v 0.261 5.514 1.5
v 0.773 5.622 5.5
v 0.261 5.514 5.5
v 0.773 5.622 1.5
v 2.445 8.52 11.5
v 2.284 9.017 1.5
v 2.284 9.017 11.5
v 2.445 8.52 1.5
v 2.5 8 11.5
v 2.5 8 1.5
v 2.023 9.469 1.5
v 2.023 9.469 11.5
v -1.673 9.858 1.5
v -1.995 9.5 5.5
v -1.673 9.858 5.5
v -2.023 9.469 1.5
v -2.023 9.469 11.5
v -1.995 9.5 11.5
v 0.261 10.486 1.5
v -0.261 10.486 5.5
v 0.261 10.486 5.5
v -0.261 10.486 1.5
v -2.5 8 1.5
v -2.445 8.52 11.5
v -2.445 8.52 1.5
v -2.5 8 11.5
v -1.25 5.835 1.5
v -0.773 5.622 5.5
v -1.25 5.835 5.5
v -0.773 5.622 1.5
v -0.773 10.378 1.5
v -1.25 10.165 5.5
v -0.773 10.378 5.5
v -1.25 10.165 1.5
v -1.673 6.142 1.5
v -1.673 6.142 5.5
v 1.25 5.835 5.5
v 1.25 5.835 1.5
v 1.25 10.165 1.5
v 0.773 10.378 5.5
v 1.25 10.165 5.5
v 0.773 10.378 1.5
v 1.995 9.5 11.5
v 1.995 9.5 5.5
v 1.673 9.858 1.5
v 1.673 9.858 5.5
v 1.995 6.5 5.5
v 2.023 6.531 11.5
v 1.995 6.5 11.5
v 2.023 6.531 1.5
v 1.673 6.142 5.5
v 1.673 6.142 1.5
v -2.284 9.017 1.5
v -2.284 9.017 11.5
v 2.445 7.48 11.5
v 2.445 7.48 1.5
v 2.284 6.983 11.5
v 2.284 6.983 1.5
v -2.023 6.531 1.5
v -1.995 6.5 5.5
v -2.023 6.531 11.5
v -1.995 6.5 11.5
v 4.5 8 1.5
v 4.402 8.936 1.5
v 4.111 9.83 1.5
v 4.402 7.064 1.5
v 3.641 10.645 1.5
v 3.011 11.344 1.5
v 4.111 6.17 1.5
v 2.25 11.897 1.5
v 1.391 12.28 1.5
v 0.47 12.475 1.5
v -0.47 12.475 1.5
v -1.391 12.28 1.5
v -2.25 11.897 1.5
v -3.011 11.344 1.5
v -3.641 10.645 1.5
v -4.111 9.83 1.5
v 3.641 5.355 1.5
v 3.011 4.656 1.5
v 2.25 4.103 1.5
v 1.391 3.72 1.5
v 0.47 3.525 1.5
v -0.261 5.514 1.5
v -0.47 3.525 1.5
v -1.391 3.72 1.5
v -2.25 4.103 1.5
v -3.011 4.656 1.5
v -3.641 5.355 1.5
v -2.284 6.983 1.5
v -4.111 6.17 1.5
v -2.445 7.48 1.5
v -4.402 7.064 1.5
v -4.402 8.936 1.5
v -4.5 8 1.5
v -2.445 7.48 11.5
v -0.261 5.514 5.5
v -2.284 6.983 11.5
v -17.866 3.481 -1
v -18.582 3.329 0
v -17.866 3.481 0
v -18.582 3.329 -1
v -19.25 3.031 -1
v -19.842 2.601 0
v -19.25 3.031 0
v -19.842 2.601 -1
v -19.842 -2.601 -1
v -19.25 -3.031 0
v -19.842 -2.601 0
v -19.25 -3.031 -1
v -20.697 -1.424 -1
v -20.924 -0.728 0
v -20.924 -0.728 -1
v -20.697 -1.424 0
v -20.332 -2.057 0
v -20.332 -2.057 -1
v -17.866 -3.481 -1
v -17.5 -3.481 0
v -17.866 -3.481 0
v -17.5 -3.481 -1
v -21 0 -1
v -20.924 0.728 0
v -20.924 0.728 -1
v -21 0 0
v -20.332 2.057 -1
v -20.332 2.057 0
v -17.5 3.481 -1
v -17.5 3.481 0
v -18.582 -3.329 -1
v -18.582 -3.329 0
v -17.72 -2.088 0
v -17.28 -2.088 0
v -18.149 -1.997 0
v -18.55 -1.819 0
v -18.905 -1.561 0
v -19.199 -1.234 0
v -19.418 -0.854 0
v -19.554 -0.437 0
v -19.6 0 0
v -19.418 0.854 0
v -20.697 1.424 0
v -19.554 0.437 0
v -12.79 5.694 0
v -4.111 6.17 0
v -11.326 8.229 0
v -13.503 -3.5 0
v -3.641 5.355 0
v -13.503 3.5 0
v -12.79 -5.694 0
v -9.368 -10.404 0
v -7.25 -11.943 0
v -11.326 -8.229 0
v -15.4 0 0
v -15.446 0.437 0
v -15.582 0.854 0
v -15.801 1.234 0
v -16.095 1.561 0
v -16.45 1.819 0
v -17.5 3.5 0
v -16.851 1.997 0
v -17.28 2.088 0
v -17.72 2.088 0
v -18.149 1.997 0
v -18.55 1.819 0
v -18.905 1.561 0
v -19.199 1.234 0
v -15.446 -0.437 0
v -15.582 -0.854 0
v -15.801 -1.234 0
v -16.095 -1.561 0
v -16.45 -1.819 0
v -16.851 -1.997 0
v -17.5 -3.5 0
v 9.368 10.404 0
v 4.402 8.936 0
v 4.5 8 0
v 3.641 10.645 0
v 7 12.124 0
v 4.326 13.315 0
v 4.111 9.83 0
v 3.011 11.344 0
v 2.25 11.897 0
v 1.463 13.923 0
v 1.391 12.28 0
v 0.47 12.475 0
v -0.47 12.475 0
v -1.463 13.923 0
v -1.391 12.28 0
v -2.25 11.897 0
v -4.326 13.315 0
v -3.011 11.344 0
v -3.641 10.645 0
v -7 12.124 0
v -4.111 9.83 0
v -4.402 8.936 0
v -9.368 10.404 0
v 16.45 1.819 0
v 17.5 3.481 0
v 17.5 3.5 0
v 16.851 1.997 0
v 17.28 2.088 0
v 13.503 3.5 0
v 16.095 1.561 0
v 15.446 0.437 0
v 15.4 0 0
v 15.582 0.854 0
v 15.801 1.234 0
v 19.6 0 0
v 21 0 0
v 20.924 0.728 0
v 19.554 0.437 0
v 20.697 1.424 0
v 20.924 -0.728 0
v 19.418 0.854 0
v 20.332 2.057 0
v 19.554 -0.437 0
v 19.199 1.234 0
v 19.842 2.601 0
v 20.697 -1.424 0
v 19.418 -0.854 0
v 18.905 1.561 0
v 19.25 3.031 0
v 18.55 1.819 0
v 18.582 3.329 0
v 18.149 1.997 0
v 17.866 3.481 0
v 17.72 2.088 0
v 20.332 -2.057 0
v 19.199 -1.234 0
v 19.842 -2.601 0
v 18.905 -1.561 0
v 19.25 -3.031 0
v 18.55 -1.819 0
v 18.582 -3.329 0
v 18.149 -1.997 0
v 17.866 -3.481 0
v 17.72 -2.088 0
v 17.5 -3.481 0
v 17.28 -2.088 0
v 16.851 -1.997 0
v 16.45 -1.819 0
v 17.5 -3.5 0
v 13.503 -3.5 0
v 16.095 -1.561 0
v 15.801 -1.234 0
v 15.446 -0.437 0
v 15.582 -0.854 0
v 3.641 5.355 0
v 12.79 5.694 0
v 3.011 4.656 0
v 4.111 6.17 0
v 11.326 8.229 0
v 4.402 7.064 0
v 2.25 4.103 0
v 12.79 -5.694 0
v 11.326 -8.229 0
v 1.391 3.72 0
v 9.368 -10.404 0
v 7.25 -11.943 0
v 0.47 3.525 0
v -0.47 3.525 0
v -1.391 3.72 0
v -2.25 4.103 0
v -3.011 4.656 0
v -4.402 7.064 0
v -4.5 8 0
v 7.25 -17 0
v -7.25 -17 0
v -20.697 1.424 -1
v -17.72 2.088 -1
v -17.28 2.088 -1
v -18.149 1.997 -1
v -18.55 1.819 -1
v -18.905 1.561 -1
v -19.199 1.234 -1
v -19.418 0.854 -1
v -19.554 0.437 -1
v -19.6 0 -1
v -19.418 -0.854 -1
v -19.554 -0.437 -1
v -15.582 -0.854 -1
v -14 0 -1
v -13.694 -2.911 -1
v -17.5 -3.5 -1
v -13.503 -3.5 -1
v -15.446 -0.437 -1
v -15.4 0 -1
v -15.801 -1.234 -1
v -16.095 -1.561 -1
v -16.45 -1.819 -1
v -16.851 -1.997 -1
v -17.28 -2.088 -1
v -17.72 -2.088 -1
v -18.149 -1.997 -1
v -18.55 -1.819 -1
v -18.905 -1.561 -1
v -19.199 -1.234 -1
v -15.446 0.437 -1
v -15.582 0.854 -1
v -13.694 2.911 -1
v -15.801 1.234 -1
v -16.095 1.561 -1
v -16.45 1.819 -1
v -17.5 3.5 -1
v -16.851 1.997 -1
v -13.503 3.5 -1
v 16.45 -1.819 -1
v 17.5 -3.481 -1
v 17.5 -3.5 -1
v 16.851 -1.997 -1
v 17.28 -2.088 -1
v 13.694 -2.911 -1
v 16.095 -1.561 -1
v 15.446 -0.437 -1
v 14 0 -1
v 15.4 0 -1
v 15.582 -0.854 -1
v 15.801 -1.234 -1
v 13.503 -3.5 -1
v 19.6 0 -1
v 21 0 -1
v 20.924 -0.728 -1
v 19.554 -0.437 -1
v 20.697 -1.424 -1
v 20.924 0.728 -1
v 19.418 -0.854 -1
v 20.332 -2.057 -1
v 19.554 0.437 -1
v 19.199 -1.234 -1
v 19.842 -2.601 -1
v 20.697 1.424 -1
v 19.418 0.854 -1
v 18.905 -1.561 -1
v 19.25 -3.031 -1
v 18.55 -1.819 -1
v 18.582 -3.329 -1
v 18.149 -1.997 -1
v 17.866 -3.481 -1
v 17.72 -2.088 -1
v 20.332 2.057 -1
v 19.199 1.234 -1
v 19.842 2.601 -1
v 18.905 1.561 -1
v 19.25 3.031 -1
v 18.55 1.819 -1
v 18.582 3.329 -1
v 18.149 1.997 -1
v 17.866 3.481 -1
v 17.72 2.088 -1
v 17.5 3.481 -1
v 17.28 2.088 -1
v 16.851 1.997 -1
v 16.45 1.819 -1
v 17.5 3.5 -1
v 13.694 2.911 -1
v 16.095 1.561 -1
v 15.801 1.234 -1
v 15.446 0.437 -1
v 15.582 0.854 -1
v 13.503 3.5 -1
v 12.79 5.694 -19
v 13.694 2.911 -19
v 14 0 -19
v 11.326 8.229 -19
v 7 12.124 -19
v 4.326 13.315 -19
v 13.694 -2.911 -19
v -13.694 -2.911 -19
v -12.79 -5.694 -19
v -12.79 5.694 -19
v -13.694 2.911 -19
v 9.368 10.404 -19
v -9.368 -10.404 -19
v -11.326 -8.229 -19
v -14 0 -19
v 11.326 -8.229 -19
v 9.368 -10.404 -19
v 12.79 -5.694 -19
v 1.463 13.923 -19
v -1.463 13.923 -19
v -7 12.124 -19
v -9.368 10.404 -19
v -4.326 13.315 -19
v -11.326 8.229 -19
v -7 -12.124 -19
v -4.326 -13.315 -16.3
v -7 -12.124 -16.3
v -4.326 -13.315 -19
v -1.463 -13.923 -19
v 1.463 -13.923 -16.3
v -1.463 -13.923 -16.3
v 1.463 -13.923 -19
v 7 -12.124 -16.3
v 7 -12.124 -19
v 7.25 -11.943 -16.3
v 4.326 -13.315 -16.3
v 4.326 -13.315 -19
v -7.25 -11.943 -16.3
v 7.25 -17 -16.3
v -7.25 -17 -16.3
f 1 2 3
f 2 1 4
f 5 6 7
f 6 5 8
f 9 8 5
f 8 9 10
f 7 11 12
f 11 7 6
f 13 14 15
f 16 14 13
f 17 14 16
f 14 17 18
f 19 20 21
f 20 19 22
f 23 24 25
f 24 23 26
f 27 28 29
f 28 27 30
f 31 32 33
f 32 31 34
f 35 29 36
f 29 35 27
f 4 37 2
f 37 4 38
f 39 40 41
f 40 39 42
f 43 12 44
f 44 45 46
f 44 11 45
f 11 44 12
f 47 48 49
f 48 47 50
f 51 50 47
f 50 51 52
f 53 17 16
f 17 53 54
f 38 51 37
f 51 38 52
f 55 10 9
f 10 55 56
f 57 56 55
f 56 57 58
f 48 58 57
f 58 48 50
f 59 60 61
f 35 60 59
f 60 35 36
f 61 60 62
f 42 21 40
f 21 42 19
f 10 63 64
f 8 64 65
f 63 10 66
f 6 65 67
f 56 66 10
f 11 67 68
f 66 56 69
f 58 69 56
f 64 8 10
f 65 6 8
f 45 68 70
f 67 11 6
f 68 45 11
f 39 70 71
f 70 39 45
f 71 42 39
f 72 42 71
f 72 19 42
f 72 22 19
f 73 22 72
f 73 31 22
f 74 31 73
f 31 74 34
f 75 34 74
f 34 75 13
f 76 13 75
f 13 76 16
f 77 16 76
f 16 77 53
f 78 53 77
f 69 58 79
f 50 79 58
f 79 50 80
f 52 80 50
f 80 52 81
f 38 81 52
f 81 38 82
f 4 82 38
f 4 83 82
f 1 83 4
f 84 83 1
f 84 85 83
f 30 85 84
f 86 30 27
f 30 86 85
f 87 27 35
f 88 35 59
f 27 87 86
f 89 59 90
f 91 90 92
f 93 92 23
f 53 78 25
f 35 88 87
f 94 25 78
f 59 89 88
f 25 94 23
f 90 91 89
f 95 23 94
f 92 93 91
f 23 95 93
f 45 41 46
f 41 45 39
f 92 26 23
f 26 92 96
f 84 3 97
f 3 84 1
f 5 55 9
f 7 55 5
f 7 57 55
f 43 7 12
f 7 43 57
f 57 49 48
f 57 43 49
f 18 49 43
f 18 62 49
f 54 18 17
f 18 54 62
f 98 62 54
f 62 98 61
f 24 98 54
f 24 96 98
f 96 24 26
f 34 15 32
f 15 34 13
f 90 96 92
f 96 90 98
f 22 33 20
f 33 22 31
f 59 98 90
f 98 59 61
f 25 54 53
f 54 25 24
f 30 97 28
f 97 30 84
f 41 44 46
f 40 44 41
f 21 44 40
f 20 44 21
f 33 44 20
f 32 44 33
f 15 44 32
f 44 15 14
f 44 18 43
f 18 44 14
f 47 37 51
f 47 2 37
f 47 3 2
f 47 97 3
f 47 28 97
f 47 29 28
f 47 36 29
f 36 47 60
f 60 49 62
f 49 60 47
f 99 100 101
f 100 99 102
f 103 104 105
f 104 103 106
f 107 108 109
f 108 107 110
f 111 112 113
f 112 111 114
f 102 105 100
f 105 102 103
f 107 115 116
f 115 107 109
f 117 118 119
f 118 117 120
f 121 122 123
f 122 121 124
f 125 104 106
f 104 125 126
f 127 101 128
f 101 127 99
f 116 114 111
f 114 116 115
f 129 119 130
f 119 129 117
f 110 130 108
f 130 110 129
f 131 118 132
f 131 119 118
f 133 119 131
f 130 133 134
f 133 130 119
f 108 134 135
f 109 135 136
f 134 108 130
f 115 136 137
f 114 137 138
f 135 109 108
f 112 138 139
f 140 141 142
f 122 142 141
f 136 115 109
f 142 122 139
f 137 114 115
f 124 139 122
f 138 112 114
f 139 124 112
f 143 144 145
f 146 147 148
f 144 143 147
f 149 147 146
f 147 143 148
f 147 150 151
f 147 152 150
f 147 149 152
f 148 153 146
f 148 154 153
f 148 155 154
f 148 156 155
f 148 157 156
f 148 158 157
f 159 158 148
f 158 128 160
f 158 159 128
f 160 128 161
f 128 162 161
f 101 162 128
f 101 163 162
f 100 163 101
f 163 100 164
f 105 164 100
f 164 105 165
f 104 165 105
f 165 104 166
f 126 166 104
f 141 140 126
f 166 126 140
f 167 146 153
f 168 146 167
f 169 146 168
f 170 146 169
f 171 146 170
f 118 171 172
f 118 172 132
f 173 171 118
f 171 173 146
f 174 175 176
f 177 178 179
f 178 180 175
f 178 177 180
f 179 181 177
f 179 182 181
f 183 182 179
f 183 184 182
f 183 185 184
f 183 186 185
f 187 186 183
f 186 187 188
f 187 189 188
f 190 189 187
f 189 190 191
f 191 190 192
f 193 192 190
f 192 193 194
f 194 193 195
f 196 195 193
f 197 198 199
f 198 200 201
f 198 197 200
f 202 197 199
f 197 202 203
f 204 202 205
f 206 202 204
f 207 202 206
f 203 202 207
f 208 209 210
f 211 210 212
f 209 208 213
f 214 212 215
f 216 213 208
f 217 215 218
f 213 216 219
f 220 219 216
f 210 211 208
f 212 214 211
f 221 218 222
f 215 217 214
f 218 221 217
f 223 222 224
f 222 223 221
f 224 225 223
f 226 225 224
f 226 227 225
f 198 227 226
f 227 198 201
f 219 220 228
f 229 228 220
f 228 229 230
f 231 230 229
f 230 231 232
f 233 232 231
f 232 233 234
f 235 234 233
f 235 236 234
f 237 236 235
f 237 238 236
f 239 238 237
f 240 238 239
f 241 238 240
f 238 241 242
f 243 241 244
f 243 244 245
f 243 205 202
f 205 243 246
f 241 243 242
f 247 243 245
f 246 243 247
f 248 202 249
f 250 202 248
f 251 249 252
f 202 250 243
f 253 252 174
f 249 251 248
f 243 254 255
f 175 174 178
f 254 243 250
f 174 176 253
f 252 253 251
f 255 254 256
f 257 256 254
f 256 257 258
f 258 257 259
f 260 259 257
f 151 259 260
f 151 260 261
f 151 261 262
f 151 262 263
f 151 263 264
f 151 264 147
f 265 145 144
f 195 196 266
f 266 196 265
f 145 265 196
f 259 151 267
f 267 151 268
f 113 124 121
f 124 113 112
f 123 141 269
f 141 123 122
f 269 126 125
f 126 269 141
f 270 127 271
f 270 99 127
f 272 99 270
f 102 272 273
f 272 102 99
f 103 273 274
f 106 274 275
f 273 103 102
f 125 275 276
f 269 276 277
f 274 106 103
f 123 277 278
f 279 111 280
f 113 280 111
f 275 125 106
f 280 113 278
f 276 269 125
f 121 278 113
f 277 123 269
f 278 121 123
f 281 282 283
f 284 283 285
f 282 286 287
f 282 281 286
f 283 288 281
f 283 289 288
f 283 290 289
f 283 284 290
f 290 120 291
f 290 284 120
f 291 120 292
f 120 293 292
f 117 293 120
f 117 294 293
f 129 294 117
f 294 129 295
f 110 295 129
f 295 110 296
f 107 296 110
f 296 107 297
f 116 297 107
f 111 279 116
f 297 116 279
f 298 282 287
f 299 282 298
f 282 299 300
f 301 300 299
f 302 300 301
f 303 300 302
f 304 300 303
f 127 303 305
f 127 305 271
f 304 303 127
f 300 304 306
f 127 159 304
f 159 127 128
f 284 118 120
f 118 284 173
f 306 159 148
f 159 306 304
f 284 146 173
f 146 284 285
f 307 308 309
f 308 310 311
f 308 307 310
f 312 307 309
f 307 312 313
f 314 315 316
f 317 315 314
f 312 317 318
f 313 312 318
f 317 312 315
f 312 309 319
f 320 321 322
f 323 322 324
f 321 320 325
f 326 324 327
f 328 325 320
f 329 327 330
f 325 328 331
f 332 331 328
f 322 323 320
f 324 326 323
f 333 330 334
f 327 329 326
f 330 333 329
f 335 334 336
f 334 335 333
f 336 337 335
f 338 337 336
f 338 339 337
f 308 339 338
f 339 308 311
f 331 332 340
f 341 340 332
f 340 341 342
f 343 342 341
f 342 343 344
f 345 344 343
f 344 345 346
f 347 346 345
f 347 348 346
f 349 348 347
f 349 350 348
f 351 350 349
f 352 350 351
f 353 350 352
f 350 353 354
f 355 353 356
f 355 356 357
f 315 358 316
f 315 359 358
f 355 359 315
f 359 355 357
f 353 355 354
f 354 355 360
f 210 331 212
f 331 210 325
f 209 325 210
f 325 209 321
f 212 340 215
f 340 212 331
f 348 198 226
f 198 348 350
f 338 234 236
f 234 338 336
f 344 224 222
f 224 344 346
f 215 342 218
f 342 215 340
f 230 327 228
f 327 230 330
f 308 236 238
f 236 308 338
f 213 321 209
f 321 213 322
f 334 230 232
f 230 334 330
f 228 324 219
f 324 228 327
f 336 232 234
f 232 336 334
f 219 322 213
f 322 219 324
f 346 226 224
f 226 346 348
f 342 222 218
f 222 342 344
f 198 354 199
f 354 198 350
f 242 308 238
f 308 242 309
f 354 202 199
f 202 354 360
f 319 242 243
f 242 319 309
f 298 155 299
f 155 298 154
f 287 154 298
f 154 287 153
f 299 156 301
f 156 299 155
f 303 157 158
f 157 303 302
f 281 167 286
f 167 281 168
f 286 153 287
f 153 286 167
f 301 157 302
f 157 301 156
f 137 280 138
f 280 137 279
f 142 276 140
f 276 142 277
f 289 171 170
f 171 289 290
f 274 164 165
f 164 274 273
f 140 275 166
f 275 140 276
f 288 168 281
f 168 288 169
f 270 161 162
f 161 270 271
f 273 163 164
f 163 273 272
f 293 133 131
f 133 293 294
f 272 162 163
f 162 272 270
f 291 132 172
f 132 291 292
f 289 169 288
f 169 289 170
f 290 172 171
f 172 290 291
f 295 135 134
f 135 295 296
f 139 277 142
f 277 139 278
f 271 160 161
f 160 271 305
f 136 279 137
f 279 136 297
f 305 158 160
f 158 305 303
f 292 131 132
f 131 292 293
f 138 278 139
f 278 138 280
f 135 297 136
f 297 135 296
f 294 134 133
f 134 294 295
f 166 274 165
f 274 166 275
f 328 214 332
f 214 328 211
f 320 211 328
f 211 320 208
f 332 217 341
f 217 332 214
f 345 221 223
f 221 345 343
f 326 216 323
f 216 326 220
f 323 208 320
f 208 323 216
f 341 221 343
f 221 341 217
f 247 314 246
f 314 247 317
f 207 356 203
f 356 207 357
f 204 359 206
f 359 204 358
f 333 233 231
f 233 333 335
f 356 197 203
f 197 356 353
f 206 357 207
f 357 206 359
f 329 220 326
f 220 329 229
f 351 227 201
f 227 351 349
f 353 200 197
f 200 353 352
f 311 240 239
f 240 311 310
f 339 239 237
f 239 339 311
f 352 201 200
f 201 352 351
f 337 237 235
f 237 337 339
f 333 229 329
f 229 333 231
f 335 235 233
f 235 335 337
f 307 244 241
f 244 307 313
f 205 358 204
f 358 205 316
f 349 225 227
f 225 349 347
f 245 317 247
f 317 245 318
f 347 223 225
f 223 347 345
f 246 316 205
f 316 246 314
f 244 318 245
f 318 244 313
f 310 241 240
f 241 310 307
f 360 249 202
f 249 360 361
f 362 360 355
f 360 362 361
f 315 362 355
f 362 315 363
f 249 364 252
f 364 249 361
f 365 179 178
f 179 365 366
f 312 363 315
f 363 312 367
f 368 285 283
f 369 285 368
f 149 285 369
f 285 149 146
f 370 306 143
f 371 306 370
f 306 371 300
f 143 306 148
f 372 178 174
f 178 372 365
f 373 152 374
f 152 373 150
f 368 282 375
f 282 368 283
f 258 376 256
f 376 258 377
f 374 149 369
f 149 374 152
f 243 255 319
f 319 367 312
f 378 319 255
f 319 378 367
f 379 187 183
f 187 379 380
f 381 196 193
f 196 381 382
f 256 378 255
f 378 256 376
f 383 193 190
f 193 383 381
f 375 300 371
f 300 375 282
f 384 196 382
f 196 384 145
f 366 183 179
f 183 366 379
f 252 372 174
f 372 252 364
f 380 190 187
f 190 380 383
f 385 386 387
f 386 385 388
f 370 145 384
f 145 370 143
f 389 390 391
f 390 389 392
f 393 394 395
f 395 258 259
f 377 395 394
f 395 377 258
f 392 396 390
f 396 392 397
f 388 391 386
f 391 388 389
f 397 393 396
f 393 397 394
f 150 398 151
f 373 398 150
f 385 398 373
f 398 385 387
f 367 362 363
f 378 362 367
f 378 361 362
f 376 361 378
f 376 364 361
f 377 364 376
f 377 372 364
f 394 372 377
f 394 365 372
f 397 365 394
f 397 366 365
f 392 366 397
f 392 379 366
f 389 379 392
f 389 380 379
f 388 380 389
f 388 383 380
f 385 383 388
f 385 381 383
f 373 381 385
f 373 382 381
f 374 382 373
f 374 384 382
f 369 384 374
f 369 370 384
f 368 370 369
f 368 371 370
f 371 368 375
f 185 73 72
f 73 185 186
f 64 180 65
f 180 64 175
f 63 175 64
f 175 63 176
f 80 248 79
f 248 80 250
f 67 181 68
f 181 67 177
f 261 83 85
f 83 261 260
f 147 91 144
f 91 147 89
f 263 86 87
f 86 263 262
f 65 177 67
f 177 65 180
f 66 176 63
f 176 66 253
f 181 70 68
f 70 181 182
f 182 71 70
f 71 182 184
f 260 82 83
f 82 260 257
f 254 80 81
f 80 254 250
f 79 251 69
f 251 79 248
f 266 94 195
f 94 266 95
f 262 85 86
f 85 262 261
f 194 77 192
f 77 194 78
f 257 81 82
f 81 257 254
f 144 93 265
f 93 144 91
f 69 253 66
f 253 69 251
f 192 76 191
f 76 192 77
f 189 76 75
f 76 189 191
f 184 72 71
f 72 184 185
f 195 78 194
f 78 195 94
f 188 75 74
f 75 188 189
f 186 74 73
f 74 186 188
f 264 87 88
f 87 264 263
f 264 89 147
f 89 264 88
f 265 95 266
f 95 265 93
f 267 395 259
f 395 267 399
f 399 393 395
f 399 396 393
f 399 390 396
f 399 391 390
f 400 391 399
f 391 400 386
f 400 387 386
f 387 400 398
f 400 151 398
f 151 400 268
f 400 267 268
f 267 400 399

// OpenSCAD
include <MCAD/units.scad>

module byj_motor_mount(slide_distance=0, mochup=true, tolerance=0){

	motor_shaft_diameter = 5*mm;
	motor_shaft_length = 10*mm;
	motor_shaft_key = 6*mm;
	pilot_diameter = 9*mm;
	pilot_length = 1.5*mm;
	bolt_hole_size = 4.2*mm;
	bolt_hole_distance = 35*mm;
	pilot_offset = 8*mm;
	motor_diameter = 28*mm;
	motor_length = 19*mm;
	wire_harness_width = 14.5*mm;
	wire_harness_offset = 17*mm;
	wire_harness_length = motor_length - 2.7*mm;
	mounting_tab_width = 7*mm;
	$fn = 30;



	// == motor mock-up ==
	//motor box
	if (mochup == true)
	{
		union(){

		// motor body
		translate([0, 0, -motor_length]) cylinder(r = motor_diameter / 2, h = motor_length);

		// pilot
		translate([0, pilot_offset, 0]) cylinder(r=pilot_diameter / 2, h = pilot_length);

		// shaft
		difference(){
		translate([0, pilot_offset, pilot_length]) cylinder(r = motor_shaft_diameter / 2, h = motor_shaft_length);
		translate([- motor_shaft_diameter / 2, pilot_offset + motor_shaft_diameter / 2 - 1, pilot_length + motor_shaft_length - motor_shaft_key]) cube([motor_shaft_diameter, 2, motor_shaft_key + 1]);
		translate([- motor_shaft_diameter / 2, pilot_offset - motor_shaft_diameter / 2 - 1, pilot_length + motor_shaft_length - motor_shaft_key]) cube([motor_shaft_diameter, 2, motor_shaft_key + 1]);
		}

		// mounting tabs
		difference(){
		union(){
		translate([- bolt_hole_distance / 2, 0, -1]) cylinder(r = mounting_tab_width / 2, h = 1);
		translate([- bolt_hole_distance / 2, -mounting_tab_width / 2, -1]) cube([mounting_tab_width, mounting_tab_width, 1]);

		translate([bolt_hole_distance / 2, 0, -1]) cylinder(r = mounting_tab_width / 2, h = 1);
		translate([bolt_hole_distance / 2 - mounting_tab_width, -mounting_tab_width / 2, -1]) cube([mounting_tab_width, mounting_tab_width, 1]);
		}
		translate([- bolt_hole_distance / 2, 0, -2]) cylinder(r = bolt_hole_size / 2, h = 3);
		translate([bolt_hole_distance / 2, 0, -2]) cylinder(r = bolt_hole_size / 2, h = 3);
		}

		// wire harness
		translate([- wire_harness_width / 2, - wire_harness_offset, - wire_harness_length]) cube([wire_harness_width, motor_diameter / 2, wire_harness_length]);
		}
	}
}

byj_motor_mount();
